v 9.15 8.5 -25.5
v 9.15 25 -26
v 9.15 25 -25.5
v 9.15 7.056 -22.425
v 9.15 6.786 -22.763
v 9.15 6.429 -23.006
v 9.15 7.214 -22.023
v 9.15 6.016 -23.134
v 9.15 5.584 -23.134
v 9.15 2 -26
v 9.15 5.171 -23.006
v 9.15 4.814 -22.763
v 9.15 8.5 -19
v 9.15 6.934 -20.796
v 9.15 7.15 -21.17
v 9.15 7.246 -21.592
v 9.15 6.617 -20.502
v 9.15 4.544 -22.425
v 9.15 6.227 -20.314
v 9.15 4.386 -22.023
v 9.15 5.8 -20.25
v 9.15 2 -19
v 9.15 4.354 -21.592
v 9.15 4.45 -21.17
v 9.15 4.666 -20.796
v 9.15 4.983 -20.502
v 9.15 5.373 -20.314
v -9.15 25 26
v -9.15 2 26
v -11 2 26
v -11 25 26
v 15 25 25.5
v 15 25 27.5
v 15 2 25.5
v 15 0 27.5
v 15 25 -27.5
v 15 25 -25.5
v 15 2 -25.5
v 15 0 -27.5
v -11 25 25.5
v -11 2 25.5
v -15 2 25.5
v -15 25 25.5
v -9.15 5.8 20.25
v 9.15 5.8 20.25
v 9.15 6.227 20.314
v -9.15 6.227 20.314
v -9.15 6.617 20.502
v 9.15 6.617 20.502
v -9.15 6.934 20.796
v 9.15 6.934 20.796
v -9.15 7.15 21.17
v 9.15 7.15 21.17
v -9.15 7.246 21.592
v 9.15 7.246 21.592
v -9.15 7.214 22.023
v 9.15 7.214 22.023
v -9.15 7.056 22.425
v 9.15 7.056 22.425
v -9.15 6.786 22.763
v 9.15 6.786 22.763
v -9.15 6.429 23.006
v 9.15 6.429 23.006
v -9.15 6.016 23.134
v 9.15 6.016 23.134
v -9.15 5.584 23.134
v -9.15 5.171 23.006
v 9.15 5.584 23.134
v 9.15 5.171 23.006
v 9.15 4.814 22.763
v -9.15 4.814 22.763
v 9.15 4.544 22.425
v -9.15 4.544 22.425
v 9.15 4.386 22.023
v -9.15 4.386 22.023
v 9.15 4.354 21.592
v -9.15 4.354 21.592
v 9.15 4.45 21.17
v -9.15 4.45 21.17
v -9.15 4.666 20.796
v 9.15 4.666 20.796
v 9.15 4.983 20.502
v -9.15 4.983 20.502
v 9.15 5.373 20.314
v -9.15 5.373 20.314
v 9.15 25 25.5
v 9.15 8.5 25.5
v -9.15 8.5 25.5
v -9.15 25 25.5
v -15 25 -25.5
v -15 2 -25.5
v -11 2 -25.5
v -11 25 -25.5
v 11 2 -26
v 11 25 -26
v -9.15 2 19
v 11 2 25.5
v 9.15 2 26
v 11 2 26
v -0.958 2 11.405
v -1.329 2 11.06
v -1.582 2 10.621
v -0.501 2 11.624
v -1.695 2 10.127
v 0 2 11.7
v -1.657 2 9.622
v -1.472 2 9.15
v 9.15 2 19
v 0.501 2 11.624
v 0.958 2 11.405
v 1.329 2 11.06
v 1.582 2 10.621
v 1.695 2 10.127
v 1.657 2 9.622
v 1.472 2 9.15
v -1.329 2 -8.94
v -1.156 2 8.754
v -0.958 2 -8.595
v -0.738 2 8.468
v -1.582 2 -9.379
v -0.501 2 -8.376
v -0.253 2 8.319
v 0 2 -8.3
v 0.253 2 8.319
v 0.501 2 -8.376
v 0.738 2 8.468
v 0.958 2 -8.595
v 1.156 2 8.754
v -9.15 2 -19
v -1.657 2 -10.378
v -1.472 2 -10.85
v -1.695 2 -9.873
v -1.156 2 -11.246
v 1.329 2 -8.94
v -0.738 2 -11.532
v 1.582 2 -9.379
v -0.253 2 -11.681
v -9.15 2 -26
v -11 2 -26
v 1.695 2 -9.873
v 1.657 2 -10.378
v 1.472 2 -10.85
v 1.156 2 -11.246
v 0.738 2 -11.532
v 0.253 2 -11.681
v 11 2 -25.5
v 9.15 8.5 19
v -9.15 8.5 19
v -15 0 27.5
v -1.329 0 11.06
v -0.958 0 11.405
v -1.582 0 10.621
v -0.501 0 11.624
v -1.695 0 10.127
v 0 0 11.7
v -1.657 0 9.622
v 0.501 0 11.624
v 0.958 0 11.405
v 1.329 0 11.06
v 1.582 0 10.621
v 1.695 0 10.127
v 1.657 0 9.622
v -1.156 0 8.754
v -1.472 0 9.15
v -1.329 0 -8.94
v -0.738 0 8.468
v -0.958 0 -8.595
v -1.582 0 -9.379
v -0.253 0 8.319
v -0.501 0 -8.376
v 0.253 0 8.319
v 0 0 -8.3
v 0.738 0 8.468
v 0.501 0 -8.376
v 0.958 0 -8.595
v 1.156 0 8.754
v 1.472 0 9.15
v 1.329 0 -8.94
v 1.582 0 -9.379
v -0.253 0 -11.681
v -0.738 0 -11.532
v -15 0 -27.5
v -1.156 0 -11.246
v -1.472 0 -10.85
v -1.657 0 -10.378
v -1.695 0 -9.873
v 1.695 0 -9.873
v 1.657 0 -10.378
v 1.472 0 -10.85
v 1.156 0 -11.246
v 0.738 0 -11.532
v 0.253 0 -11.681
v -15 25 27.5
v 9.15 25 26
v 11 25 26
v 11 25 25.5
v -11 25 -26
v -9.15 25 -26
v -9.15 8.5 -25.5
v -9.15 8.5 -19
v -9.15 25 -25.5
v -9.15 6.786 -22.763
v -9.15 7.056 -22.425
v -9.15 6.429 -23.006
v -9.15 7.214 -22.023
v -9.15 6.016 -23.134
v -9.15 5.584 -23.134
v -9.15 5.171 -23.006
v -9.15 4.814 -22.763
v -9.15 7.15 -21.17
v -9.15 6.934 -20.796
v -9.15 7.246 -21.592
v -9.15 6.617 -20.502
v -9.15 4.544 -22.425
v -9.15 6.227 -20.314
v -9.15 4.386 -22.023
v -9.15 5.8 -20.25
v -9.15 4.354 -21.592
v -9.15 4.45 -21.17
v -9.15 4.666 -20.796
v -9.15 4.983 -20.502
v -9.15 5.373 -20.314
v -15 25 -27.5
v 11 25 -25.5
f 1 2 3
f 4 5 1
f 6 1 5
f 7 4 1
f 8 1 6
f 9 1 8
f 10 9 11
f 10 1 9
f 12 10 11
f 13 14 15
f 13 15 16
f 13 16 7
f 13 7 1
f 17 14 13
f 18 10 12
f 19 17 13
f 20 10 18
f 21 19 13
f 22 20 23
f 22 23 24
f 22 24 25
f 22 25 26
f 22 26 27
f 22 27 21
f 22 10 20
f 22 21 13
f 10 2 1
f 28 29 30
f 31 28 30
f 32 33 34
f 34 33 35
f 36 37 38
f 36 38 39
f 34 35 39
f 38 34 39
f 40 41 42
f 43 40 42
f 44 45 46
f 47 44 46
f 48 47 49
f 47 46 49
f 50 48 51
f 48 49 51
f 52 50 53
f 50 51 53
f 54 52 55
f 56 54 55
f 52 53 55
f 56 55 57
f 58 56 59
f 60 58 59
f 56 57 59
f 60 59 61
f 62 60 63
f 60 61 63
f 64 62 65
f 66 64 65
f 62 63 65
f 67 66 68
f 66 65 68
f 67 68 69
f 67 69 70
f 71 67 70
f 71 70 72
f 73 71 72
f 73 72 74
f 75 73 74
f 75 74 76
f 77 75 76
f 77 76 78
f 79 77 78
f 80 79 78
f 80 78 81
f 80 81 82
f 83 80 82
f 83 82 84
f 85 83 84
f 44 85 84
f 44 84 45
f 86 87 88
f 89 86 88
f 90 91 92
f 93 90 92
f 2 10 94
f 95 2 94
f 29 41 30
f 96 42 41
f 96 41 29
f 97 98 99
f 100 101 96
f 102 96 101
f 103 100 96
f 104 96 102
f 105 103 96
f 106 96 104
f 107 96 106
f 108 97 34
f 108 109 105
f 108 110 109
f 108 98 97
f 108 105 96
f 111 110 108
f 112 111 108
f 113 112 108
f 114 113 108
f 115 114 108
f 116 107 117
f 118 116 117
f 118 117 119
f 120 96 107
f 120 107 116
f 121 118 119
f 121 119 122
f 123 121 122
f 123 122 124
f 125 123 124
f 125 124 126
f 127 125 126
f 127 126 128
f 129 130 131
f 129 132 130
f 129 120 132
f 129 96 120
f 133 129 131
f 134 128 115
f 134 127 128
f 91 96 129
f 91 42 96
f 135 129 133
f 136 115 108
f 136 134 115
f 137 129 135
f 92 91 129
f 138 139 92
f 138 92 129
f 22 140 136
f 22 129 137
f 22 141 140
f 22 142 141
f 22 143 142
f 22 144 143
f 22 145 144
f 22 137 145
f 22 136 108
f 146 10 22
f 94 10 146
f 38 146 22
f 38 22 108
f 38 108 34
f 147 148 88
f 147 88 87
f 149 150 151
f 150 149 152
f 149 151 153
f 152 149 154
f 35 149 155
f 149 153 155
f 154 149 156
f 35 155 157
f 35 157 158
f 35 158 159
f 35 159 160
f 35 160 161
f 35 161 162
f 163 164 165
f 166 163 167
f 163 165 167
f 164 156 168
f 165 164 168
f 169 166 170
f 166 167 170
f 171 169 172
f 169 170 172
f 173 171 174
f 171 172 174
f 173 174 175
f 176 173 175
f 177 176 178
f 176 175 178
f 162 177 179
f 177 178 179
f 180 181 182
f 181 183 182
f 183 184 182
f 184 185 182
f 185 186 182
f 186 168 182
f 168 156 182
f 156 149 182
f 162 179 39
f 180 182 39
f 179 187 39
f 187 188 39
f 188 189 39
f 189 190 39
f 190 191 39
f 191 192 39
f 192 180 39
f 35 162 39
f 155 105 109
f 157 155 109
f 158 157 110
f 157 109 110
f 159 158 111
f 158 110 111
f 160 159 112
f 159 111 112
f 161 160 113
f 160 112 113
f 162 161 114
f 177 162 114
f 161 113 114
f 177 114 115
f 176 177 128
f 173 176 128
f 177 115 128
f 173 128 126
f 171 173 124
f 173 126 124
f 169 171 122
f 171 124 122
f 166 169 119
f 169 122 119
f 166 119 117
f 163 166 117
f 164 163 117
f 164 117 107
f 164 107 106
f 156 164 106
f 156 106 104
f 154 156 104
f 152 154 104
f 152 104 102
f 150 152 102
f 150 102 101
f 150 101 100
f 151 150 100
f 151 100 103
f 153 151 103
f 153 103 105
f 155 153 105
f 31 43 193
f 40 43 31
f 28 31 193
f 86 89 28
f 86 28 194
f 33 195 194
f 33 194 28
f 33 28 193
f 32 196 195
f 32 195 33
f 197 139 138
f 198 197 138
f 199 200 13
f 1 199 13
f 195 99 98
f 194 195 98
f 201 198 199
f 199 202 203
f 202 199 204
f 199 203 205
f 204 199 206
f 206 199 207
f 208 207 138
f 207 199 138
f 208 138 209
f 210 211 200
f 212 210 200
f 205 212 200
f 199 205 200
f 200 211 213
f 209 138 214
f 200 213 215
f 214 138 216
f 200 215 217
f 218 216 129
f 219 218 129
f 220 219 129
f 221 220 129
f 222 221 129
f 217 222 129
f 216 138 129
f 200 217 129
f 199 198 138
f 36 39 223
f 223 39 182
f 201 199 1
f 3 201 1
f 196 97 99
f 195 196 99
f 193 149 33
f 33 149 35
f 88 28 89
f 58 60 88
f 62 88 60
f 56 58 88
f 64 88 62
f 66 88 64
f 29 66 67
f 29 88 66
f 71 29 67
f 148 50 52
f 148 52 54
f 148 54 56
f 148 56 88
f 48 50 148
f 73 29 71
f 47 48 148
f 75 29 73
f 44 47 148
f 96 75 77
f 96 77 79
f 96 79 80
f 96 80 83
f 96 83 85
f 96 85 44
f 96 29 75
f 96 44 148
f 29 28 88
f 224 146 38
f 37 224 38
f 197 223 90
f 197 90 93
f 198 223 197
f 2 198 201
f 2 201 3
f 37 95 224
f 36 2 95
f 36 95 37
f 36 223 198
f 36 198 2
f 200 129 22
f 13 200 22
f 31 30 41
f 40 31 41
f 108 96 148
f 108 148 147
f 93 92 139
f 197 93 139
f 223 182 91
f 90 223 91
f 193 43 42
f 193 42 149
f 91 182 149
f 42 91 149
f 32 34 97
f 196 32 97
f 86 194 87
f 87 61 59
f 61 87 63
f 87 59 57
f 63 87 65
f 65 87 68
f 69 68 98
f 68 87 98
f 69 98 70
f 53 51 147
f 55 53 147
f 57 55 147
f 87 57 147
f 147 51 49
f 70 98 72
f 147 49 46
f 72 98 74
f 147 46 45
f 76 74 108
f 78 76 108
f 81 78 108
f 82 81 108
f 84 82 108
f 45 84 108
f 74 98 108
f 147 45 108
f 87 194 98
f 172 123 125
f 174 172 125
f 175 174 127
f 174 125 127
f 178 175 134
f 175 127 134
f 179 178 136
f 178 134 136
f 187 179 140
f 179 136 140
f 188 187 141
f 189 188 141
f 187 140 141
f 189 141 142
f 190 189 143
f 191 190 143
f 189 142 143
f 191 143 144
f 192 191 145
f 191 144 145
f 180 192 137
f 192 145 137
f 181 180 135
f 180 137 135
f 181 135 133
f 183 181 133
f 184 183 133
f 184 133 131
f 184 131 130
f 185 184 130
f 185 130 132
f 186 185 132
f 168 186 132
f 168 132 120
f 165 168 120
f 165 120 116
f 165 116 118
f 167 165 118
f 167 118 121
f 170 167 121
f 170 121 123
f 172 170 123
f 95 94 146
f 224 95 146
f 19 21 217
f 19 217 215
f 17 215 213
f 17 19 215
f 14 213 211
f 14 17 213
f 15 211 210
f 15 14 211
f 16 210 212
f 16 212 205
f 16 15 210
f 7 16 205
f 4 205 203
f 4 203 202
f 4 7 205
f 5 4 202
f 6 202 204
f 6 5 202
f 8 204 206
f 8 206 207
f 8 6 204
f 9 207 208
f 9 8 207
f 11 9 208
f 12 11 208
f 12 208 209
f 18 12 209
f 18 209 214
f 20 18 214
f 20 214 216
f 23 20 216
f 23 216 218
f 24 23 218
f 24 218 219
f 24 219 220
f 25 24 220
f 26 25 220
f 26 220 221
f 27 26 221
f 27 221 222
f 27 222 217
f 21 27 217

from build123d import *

# Parameters (mm, degrees)
BOSS_EXTRUDE1_DEPTH   = 25
BOSS_EXTRUDE1_2_DEPTH = 25
BOSS_EXTRUDE2_DEPTH   = 2
SKETCH2_W             = 18.3
SKETCH2_H             = 6.5
BOSS_EXTRUDE3_DEPTH   = 6.5
CUT_EXTRUDE1_REACH    = 46.322
SKETCH3_R             = 1.45
CUT_EXTRUDE3_REACH    = 40.862
SKETCH4_R             = 1.7


with BuildPart() as part:
    # Sketch1 → Boss-Extrude1 (new body)
    with BuildSketch(Plane(origin=(0, 0, 0), x_dir=(1, 0, 0), z_dir=(0, 1, 0))):
        Polygon((15, 27.5), (-15, 27.5), (-15, 25.5), (-11, 25.5), (-11, 26), (-9.15, 26), (-9.15, 25.5), (9.15, 25.5), (9.15, 26), (11, 26), (11, 25.5), (15, 25.5), align=None)
    extrude(amount=BOSS_EXTRUDE1_DEPTH)



with BuildPart() as body_2:
    # Sketch1 → Boss-Extrude1 2 (new body)
    with BuildSketch(Plane(origin=(0, 0, 0), x_dir=(1, 0, 0), z_dir=(0, 1, 0))):
        Polygon((-11, -25.5), (-15, -25.5), (-15, -27.5), (15, -27.5), (15, -25.5), (11, -25.5), (11, -26), (9.15, -26), (9.15, -25.5), (-9.15, -25.5), (-9.15, -26), (-11, -26), align=None)
    extrude(amount=BOSS_EXTRUDE1_2_DEPTH)


with BuildPart() as part_1:
    add(part.part)

    add(body_2.part)  # Boss-Extrude2 merges body 2
    # Sketch1<3> → Boss-Extrude2 (add)
    with BuildSketch(Plane(origin=(0, 0, 0), x_dir=(1, 0, 0), z_dir=(0, 1, 0))):
        Polygon((-11, 25.5), (-15, 25.5), (-15, -25.5), (-11, -25.5), (-11, -26), (-9.15, -26), (-9.15, -25.5), (9.15, -25.5), (9.15, -26), (11, -26), (11, -25.5), (15, -25.5), (15, 25.5), (11, 25.5), (11, 26), (9.15, 26), (9.15, 25.5), (-9.15, 25.5), (-9.15, 26), (-11, 26), align=None)
    extrude(amount=BOSS_EXTRUDE2_DEPTH)

    # Sketch2 → Boss-Extrude3 (add)
    with BuildSketch(Plane(origin=(0, 2, 0), x_dir=(1, 0, 0), z_dir=(0, 1, 0))):
        with Locations((0, -22.25)):
            Rectangle(SKETCH2_W, SKETCH2_H)
    boss_extrude3 = extrude(amount=BOSS_EXTRUDE3_DEPTH)

    # Sketch3 → Cut-Extrude1 (cut, up to next)
    with BuildSketch(Plane(origin=(9.15, 0, 0), x_dir=(0, 0, -1), z_dir=(1, 0, 0)), mode=Mode.PRIVATE) as cut_extrude1_sk1:
        with Locations((-21.7, 5.8)):
            Circle(SKETCH3_R)
    cut_extrude1_tool1 = extrude(cut_extrude1_sk1.sketch, amount=-CUT_EXTRUDE1_REACH, mode=Mode.PRIVATE) & part_1.part
    cut_extrude1 = cut_extrude1_tool1.solids().sort_by_distance((9.15, 5.8, 21.7))[0]
    add(cut_extrude1, mode=Mode.SUBTRACT)

    # Sketch4 → Cut-Extrude3 (cut, up to next)
    with BuildSketch(Plane(origin=(0, 2, 0), x_dir=(1, 0, 0), z_dir=(0, 1, 0)), mode=Mode.PRIVATE) as cut_extrude3_sk1:
        with Locations((0, 10)):
            Circle(SKETCH4_R)
    cut_extrude3_tool1 = extrude(cut_extrude3_sk1.sketch, amount=-CUT_EXTRUDE3_REACH, mode=Mode.PRIVATE) & part_1.part
    # Sketch4 → Cut-Extrude3 (cut, up to next)
    with BuildSketch(Plane(origin=(0, 2, 0), x_dir=(1, 0, 0), z_dir=(0, 1, 0)), mode=Mode.PRIVATE) as cut_extrude3_sk2:
        with Locations((0, -10)):
            Circle(SKETCH4_R)
    cut_extrude3_tool2 = extrude(cut_extrude3_sk2.sketch, amount=-CUT_EXTRUDE3_REACH, mode=Mode.PRIVATE) & part_1.part
    add(cut_extrude3_tool1.solids().sort_by_distance((0, 2, -10))[0], mode=Mode.SUBTRACT)
    add(cut_extrude3_tool2.solids().sort_by_distance((0, 2, 10))[0], mode=Mode.SUBTRACT)

    # Mirror1: Boss-Extrude3, Cut-Extrude1 across plane
    add(boss_extrude3.mirror(Plane.XY))
    add(cut_extrude1.mirror(Plane.XY), mode=Mode.SUBTRACT)


solid = part_1.part
